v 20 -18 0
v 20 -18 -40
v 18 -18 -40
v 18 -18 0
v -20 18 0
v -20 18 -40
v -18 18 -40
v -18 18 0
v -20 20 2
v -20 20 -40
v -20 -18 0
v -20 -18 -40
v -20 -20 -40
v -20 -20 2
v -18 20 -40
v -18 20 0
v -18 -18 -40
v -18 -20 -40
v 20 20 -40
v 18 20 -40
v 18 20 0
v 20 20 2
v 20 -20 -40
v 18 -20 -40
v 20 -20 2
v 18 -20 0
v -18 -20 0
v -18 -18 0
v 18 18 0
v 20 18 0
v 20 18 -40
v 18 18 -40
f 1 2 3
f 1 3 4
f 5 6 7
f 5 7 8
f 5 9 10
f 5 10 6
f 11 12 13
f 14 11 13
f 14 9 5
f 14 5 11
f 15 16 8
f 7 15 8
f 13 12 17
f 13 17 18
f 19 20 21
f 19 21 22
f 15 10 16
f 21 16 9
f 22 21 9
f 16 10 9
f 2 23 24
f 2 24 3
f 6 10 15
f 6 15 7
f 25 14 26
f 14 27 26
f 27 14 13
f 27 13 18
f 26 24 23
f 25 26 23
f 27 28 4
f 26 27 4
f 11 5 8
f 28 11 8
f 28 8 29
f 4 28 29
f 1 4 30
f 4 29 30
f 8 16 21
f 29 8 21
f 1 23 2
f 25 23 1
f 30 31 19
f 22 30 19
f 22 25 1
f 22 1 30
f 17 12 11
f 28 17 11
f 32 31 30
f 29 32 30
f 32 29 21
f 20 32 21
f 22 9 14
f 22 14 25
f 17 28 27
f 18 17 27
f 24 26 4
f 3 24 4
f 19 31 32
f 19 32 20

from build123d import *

# Parameters (mm, degrees)
F0_W     = 40
F0_H     = 40
F1_DEPTH = 2
F2_W     = 2
F2_H     = 40
F3_DEPTH = 2
F4_W     = 2
F4_H     = 40
F5_DEPTH = 2


with BuildPart() as f1:
    # F0 (on Top) → F1 (new body)
    with BuildSketch(Plane.XY):
        Rectangle(F0_W, F0_H)
    extrude(amount=F1_DEPTH)

    # F2 (on face) → F3 (join)
    with BuildSketch(Plane.YZ.offset(20)):
        with Locations((19, -20)):
            Rectangle(F2_W, F2_H)
        with Locations((-19, -20)):
            Rectangle(F2_W, F2_H)
    extrude(amount=-F3_DEPTH)

    # F4 (on face) → F5 (join)
    with BuildSketch(Plane(origin=(-20, 0, 0), x_dir=(0, -1, 0), z_dir=(-1, 0, 0))):
        with Locations((-19, -20)):
            Rectangle(F4_W, F4_H)
        with Locations((19, -20)):
            Rectangle(F4_W, F4_H)
    extrude(amount=-F5_DEPTH)


solid = f1.part
